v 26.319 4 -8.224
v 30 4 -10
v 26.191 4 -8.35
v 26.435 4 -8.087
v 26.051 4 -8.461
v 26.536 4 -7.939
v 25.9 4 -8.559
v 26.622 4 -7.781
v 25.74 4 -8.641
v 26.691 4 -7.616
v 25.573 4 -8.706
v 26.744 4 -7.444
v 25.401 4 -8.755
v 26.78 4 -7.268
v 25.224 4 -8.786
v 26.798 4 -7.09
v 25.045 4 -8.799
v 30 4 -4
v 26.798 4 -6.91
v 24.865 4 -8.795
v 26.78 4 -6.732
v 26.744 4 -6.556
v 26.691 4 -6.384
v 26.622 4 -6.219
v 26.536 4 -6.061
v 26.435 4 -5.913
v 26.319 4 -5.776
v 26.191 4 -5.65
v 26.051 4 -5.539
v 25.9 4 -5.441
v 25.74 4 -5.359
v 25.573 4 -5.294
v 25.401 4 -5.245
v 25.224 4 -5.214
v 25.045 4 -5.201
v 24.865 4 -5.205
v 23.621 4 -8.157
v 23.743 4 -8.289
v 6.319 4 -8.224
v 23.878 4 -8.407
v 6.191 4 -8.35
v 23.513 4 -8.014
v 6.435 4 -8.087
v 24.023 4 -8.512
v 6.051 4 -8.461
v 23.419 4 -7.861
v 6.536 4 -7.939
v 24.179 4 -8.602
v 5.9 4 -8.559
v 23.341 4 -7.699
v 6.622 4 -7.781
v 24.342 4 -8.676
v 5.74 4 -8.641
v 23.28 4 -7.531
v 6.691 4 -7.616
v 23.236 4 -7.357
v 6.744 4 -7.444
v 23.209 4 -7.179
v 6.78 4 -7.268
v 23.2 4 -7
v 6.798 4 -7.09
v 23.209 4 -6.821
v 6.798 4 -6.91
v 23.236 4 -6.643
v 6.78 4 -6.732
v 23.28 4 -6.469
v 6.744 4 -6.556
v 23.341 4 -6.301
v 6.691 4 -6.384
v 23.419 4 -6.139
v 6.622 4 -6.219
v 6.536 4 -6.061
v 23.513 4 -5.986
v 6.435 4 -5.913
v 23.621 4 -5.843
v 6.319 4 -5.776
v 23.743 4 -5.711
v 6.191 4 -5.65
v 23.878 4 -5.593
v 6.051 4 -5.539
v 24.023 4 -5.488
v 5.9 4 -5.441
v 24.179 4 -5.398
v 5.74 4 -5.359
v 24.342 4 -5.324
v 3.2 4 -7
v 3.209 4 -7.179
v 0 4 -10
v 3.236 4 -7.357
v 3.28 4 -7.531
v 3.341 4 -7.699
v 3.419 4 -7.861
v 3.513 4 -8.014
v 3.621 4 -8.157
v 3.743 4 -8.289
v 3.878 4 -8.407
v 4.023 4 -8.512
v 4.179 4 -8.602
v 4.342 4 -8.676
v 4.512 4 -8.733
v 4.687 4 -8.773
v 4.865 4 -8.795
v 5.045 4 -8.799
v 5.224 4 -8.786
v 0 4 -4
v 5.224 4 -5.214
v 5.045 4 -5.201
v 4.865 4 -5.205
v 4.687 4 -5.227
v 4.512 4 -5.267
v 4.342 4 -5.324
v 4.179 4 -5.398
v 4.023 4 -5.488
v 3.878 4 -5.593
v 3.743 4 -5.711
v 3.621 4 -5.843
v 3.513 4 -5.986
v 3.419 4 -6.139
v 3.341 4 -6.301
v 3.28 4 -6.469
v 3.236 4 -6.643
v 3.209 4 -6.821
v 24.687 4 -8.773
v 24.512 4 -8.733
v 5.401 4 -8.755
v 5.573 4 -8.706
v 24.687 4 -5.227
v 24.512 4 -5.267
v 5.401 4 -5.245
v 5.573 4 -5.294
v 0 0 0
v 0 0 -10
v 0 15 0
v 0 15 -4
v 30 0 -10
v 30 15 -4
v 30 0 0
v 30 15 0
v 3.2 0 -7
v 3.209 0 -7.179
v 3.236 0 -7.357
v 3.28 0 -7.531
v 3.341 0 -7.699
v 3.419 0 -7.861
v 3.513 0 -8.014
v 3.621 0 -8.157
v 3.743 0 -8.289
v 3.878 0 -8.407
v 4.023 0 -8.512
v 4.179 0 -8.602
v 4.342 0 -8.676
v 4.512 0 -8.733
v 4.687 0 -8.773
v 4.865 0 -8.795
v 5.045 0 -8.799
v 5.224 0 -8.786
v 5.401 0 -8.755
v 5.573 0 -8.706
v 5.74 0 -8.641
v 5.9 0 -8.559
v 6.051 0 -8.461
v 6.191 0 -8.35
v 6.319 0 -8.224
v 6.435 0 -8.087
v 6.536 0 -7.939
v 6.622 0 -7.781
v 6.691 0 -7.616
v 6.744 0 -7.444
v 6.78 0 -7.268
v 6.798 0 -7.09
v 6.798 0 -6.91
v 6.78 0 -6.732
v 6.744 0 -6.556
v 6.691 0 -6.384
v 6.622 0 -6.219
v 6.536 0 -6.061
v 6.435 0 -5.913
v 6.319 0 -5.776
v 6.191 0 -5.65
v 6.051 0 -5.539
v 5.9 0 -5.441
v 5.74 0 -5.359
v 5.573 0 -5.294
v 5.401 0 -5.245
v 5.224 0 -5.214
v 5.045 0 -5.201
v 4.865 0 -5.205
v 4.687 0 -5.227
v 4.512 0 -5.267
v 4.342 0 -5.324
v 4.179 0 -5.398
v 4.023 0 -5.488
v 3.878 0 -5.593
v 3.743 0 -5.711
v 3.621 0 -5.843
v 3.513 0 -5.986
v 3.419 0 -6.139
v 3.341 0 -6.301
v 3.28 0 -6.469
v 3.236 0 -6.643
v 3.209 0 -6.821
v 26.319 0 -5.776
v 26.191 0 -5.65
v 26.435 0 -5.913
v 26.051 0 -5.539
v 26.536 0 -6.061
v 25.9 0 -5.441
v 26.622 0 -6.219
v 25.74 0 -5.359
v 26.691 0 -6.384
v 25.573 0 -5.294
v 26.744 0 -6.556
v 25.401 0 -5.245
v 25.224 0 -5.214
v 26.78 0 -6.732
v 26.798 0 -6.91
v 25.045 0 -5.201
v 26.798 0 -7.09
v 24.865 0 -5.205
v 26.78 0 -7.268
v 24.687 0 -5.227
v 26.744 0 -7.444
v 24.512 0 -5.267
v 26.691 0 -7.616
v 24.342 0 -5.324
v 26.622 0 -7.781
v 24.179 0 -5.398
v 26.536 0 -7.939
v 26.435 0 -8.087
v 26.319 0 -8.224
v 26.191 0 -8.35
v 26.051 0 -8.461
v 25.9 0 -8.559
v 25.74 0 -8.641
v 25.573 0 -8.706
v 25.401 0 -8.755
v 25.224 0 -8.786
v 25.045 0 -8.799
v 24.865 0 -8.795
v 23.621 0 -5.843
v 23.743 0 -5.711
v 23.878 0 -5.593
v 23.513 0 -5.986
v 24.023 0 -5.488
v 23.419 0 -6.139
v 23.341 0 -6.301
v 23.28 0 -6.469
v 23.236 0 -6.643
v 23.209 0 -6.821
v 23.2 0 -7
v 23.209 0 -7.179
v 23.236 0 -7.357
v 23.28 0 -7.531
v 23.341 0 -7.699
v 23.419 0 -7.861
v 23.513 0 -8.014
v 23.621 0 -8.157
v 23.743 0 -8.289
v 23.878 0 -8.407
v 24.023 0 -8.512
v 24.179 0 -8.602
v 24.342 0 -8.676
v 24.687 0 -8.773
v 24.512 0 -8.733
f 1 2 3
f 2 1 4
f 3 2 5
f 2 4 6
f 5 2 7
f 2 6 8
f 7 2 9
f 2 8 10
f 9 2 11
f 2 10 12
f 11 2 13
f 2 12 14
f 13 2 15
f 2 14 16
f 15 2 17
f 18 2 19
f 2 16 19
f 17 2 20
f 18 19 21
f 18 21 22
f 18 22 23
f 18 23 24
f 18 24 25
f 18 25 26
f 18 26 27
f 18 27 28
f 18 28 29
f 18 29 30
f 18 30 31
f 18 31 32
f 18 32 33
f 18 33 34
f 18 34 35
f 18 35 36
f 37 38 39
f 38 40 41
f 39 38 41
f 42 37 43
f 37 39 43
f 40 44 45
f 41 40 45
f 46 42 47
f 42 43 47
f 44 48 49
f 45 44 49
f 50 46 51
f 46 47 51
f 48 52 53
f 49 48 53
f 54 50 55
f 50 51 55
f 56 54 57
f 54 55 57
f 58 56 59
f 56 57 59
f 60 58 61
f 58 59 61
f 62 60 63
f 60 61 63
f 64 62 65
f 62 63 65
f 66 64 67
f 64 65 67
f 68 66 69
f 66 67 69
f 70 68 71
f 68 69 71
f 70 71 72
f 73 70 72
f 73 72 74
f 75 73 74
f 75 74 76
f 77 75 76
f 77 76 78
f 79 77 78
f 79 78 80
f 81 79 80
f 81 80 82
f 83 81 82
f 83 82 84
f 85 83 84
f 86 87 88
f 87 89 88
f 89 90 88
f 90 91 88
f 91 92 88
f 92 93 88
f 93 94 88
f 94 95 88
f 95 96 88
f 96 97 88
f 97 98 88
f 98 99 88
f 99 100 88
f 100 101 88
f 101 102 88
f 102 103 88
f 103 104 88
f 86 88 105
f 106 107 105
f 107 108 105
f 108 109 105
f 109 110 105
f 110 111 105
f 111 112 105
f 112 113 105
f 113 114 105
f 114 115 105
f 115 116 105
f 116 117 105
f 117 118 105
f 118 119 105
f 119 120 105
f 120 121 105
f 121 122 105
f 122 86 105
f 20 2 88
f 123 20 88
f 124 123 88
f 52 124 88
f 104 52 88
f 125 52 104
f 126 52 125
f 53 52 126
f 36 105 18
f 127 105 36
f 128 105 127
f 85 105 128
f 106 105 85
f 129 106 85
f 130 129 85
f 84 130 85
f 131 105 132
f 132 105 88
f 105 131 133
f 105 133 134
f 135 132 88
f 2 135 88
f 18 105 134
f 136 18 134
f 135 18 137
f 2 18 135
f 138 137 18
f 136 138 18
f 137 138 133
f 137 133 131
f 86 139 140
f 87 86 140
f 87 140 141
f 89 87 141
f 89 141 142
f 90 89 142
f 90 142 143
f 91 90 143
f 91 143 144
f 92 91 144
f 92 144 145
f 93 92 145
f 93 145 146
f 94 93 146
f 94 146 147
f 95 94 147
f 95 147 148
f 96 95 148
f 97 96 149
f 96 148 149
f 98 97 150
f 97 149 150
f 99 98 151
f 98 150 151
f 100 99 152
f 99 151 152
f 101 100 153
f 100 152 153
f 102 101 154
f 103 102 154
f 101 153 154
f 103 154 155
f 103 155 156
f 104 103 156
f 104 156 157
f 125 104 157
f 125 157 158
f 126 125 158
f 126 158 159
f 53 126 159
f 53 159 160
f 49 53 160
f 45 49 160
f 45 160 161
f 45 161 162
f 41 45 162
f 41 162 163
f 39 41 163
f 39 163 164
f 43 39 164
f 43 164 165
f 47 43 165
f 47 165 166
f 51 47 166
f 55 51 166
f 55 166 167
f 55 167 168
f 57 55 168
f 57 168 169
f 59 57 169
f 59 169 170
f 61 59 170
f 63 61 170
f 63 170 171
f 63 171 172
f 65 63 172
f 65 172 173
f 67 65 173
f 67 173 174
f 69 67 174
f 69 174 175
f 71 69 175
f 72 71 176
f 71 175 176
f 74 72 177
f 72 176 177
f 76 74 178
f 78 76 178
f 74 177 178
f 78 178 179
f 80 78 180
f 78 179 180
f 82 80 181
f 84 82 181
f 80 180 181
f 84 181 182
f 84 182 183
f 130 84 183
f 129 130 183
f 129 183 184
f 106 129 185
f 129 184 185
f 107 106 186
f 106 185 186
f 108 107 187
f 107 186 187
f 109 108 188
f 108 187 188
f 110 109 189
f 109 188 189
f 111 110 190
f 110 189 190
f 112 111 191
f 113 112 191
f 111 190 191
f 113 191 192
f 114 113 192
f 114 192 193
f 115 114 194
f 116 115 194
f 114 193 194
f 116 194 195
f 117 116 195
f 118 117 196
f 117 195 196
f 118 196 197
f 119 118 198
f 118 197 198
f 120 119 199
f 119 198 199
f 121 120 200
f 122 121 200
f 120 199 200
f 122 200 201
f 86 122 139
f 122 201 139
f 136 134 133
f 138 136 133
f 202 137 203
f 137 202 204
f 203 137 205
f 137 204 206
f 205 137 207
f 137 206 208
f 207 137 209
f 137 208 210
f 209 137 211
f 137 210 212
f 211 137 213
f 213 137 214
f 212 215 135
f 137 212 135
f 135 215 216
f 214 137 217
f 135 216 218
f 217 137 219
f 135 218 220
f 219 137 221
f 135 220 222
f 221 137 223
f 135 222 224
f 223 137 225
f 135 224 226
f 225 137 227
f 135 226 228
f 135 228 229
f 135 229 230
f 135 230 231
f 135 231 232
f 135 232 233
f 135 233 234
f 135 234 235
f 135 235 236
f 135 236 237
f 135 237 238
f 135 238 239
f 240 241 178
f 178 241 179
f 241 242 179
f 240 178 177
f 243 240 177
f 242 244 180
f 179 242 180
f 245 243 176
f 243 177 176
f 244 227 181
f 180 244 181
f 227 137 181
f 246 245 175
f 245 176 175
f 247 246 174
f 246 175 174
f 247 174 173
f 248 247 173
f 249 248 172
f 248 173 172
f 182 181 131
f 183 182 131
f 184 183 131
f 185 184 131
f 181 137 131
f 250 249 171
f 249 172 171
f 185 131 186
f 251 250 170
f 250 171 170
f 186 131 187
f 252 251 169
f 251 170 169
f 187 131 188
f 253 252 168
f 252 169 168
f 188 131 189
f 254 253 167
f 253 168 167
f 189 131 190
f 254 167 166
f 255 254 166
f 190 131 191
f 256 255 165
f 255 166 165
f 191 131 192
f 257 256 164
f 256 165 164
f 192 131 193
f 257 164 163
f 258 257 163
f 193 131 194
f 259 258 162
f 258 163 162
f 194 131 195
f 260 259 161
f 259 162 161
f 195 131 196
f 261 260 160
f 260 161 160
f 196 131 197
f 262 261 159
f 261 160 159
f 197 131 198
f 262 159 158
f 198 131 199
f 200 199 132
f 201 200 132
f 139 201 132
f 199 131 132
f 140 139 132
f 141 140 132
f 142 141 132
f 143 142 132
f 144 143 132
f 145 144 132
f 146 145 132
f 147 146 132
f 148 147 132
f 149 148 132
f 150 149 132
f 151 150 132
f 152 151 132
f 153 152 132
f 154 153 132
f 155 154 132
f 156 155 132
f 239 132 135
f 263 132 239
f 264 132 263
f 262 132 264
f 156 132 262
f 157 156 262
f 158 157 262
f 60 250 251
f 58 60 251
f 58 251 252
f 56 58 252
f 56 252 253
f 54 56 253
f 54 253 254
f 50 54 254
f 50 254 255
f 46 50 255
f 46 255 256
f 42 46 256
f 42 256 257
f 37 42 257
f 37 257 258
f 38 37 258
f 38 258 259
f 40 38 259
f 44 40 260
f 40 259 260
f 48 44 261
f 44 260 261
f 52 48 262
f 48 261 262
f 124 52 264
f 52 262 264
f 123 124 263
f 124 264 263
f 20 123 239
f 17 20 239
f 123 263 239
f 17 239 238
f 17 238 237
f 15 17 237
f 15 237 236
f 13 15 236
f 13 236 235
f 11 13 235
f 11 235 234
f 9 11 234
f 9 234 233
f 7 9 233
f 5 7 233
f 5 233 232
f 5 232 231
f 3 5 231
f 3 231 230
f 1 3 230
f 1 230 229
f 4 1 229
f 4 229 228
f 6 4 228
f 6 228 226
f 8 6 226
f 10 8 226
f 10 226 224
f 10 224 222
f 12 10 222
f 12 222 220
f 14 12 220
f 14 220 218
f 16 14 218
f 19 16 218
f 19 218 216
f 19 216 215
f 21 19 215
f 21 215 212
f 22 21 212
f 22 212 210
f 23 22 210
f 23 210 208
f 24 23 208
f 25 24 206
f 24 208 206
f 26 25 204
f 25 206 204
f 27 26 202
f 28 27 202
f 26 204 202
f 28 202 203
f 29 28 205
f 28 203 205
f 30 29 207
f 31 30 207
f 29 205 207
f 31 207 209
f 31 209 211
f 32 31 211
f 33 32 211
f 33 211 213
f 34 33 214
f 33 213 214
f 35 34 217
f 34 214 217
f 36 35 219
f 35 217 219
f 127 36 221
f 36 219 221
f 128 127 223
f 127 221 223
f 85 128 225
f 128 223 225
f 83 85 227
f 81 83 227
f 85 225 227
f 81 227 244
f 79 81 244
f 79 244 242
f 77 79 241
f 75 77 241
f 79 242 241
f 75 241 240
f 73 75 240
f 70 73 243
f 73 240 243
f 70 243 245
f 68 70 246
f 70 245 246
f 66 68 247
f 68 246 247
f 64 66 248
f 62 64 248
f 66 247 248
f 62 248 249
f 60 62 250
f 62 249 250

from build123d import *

# Parameters (mm, degrees)
BOSS_EXTRUDE1_DEPTH  = 30
M3_CLEARANCE_HOLE1_D = 3.6


with BuildPart() as part:
    # Sketch1 → Boss-Extrude1 (new body)
    with BuildSketch(Plane(origin=(0, 0, 0), x_dir=(0, 0, -1), z_dir=(1, 0, 0))):
        Polygon((0, 15), (0, 0), (10, 0), (10, 4), (4, 4), (4, 15), align=None)
    extrude(amount=BOSS_EXTRUDE1_DEPTH)

    # M3 Clearance Hole1 (through all)
    with Locations(Plane(origin=(0, 4, 0), x_dir=(1, 0, 0), z_dir=(0, 1, 0))):
        with Locations((5, 7), (25, 7)):
            Hole(M3_CLEARANCE_HOLE1_D / 2)


solid = part.part
